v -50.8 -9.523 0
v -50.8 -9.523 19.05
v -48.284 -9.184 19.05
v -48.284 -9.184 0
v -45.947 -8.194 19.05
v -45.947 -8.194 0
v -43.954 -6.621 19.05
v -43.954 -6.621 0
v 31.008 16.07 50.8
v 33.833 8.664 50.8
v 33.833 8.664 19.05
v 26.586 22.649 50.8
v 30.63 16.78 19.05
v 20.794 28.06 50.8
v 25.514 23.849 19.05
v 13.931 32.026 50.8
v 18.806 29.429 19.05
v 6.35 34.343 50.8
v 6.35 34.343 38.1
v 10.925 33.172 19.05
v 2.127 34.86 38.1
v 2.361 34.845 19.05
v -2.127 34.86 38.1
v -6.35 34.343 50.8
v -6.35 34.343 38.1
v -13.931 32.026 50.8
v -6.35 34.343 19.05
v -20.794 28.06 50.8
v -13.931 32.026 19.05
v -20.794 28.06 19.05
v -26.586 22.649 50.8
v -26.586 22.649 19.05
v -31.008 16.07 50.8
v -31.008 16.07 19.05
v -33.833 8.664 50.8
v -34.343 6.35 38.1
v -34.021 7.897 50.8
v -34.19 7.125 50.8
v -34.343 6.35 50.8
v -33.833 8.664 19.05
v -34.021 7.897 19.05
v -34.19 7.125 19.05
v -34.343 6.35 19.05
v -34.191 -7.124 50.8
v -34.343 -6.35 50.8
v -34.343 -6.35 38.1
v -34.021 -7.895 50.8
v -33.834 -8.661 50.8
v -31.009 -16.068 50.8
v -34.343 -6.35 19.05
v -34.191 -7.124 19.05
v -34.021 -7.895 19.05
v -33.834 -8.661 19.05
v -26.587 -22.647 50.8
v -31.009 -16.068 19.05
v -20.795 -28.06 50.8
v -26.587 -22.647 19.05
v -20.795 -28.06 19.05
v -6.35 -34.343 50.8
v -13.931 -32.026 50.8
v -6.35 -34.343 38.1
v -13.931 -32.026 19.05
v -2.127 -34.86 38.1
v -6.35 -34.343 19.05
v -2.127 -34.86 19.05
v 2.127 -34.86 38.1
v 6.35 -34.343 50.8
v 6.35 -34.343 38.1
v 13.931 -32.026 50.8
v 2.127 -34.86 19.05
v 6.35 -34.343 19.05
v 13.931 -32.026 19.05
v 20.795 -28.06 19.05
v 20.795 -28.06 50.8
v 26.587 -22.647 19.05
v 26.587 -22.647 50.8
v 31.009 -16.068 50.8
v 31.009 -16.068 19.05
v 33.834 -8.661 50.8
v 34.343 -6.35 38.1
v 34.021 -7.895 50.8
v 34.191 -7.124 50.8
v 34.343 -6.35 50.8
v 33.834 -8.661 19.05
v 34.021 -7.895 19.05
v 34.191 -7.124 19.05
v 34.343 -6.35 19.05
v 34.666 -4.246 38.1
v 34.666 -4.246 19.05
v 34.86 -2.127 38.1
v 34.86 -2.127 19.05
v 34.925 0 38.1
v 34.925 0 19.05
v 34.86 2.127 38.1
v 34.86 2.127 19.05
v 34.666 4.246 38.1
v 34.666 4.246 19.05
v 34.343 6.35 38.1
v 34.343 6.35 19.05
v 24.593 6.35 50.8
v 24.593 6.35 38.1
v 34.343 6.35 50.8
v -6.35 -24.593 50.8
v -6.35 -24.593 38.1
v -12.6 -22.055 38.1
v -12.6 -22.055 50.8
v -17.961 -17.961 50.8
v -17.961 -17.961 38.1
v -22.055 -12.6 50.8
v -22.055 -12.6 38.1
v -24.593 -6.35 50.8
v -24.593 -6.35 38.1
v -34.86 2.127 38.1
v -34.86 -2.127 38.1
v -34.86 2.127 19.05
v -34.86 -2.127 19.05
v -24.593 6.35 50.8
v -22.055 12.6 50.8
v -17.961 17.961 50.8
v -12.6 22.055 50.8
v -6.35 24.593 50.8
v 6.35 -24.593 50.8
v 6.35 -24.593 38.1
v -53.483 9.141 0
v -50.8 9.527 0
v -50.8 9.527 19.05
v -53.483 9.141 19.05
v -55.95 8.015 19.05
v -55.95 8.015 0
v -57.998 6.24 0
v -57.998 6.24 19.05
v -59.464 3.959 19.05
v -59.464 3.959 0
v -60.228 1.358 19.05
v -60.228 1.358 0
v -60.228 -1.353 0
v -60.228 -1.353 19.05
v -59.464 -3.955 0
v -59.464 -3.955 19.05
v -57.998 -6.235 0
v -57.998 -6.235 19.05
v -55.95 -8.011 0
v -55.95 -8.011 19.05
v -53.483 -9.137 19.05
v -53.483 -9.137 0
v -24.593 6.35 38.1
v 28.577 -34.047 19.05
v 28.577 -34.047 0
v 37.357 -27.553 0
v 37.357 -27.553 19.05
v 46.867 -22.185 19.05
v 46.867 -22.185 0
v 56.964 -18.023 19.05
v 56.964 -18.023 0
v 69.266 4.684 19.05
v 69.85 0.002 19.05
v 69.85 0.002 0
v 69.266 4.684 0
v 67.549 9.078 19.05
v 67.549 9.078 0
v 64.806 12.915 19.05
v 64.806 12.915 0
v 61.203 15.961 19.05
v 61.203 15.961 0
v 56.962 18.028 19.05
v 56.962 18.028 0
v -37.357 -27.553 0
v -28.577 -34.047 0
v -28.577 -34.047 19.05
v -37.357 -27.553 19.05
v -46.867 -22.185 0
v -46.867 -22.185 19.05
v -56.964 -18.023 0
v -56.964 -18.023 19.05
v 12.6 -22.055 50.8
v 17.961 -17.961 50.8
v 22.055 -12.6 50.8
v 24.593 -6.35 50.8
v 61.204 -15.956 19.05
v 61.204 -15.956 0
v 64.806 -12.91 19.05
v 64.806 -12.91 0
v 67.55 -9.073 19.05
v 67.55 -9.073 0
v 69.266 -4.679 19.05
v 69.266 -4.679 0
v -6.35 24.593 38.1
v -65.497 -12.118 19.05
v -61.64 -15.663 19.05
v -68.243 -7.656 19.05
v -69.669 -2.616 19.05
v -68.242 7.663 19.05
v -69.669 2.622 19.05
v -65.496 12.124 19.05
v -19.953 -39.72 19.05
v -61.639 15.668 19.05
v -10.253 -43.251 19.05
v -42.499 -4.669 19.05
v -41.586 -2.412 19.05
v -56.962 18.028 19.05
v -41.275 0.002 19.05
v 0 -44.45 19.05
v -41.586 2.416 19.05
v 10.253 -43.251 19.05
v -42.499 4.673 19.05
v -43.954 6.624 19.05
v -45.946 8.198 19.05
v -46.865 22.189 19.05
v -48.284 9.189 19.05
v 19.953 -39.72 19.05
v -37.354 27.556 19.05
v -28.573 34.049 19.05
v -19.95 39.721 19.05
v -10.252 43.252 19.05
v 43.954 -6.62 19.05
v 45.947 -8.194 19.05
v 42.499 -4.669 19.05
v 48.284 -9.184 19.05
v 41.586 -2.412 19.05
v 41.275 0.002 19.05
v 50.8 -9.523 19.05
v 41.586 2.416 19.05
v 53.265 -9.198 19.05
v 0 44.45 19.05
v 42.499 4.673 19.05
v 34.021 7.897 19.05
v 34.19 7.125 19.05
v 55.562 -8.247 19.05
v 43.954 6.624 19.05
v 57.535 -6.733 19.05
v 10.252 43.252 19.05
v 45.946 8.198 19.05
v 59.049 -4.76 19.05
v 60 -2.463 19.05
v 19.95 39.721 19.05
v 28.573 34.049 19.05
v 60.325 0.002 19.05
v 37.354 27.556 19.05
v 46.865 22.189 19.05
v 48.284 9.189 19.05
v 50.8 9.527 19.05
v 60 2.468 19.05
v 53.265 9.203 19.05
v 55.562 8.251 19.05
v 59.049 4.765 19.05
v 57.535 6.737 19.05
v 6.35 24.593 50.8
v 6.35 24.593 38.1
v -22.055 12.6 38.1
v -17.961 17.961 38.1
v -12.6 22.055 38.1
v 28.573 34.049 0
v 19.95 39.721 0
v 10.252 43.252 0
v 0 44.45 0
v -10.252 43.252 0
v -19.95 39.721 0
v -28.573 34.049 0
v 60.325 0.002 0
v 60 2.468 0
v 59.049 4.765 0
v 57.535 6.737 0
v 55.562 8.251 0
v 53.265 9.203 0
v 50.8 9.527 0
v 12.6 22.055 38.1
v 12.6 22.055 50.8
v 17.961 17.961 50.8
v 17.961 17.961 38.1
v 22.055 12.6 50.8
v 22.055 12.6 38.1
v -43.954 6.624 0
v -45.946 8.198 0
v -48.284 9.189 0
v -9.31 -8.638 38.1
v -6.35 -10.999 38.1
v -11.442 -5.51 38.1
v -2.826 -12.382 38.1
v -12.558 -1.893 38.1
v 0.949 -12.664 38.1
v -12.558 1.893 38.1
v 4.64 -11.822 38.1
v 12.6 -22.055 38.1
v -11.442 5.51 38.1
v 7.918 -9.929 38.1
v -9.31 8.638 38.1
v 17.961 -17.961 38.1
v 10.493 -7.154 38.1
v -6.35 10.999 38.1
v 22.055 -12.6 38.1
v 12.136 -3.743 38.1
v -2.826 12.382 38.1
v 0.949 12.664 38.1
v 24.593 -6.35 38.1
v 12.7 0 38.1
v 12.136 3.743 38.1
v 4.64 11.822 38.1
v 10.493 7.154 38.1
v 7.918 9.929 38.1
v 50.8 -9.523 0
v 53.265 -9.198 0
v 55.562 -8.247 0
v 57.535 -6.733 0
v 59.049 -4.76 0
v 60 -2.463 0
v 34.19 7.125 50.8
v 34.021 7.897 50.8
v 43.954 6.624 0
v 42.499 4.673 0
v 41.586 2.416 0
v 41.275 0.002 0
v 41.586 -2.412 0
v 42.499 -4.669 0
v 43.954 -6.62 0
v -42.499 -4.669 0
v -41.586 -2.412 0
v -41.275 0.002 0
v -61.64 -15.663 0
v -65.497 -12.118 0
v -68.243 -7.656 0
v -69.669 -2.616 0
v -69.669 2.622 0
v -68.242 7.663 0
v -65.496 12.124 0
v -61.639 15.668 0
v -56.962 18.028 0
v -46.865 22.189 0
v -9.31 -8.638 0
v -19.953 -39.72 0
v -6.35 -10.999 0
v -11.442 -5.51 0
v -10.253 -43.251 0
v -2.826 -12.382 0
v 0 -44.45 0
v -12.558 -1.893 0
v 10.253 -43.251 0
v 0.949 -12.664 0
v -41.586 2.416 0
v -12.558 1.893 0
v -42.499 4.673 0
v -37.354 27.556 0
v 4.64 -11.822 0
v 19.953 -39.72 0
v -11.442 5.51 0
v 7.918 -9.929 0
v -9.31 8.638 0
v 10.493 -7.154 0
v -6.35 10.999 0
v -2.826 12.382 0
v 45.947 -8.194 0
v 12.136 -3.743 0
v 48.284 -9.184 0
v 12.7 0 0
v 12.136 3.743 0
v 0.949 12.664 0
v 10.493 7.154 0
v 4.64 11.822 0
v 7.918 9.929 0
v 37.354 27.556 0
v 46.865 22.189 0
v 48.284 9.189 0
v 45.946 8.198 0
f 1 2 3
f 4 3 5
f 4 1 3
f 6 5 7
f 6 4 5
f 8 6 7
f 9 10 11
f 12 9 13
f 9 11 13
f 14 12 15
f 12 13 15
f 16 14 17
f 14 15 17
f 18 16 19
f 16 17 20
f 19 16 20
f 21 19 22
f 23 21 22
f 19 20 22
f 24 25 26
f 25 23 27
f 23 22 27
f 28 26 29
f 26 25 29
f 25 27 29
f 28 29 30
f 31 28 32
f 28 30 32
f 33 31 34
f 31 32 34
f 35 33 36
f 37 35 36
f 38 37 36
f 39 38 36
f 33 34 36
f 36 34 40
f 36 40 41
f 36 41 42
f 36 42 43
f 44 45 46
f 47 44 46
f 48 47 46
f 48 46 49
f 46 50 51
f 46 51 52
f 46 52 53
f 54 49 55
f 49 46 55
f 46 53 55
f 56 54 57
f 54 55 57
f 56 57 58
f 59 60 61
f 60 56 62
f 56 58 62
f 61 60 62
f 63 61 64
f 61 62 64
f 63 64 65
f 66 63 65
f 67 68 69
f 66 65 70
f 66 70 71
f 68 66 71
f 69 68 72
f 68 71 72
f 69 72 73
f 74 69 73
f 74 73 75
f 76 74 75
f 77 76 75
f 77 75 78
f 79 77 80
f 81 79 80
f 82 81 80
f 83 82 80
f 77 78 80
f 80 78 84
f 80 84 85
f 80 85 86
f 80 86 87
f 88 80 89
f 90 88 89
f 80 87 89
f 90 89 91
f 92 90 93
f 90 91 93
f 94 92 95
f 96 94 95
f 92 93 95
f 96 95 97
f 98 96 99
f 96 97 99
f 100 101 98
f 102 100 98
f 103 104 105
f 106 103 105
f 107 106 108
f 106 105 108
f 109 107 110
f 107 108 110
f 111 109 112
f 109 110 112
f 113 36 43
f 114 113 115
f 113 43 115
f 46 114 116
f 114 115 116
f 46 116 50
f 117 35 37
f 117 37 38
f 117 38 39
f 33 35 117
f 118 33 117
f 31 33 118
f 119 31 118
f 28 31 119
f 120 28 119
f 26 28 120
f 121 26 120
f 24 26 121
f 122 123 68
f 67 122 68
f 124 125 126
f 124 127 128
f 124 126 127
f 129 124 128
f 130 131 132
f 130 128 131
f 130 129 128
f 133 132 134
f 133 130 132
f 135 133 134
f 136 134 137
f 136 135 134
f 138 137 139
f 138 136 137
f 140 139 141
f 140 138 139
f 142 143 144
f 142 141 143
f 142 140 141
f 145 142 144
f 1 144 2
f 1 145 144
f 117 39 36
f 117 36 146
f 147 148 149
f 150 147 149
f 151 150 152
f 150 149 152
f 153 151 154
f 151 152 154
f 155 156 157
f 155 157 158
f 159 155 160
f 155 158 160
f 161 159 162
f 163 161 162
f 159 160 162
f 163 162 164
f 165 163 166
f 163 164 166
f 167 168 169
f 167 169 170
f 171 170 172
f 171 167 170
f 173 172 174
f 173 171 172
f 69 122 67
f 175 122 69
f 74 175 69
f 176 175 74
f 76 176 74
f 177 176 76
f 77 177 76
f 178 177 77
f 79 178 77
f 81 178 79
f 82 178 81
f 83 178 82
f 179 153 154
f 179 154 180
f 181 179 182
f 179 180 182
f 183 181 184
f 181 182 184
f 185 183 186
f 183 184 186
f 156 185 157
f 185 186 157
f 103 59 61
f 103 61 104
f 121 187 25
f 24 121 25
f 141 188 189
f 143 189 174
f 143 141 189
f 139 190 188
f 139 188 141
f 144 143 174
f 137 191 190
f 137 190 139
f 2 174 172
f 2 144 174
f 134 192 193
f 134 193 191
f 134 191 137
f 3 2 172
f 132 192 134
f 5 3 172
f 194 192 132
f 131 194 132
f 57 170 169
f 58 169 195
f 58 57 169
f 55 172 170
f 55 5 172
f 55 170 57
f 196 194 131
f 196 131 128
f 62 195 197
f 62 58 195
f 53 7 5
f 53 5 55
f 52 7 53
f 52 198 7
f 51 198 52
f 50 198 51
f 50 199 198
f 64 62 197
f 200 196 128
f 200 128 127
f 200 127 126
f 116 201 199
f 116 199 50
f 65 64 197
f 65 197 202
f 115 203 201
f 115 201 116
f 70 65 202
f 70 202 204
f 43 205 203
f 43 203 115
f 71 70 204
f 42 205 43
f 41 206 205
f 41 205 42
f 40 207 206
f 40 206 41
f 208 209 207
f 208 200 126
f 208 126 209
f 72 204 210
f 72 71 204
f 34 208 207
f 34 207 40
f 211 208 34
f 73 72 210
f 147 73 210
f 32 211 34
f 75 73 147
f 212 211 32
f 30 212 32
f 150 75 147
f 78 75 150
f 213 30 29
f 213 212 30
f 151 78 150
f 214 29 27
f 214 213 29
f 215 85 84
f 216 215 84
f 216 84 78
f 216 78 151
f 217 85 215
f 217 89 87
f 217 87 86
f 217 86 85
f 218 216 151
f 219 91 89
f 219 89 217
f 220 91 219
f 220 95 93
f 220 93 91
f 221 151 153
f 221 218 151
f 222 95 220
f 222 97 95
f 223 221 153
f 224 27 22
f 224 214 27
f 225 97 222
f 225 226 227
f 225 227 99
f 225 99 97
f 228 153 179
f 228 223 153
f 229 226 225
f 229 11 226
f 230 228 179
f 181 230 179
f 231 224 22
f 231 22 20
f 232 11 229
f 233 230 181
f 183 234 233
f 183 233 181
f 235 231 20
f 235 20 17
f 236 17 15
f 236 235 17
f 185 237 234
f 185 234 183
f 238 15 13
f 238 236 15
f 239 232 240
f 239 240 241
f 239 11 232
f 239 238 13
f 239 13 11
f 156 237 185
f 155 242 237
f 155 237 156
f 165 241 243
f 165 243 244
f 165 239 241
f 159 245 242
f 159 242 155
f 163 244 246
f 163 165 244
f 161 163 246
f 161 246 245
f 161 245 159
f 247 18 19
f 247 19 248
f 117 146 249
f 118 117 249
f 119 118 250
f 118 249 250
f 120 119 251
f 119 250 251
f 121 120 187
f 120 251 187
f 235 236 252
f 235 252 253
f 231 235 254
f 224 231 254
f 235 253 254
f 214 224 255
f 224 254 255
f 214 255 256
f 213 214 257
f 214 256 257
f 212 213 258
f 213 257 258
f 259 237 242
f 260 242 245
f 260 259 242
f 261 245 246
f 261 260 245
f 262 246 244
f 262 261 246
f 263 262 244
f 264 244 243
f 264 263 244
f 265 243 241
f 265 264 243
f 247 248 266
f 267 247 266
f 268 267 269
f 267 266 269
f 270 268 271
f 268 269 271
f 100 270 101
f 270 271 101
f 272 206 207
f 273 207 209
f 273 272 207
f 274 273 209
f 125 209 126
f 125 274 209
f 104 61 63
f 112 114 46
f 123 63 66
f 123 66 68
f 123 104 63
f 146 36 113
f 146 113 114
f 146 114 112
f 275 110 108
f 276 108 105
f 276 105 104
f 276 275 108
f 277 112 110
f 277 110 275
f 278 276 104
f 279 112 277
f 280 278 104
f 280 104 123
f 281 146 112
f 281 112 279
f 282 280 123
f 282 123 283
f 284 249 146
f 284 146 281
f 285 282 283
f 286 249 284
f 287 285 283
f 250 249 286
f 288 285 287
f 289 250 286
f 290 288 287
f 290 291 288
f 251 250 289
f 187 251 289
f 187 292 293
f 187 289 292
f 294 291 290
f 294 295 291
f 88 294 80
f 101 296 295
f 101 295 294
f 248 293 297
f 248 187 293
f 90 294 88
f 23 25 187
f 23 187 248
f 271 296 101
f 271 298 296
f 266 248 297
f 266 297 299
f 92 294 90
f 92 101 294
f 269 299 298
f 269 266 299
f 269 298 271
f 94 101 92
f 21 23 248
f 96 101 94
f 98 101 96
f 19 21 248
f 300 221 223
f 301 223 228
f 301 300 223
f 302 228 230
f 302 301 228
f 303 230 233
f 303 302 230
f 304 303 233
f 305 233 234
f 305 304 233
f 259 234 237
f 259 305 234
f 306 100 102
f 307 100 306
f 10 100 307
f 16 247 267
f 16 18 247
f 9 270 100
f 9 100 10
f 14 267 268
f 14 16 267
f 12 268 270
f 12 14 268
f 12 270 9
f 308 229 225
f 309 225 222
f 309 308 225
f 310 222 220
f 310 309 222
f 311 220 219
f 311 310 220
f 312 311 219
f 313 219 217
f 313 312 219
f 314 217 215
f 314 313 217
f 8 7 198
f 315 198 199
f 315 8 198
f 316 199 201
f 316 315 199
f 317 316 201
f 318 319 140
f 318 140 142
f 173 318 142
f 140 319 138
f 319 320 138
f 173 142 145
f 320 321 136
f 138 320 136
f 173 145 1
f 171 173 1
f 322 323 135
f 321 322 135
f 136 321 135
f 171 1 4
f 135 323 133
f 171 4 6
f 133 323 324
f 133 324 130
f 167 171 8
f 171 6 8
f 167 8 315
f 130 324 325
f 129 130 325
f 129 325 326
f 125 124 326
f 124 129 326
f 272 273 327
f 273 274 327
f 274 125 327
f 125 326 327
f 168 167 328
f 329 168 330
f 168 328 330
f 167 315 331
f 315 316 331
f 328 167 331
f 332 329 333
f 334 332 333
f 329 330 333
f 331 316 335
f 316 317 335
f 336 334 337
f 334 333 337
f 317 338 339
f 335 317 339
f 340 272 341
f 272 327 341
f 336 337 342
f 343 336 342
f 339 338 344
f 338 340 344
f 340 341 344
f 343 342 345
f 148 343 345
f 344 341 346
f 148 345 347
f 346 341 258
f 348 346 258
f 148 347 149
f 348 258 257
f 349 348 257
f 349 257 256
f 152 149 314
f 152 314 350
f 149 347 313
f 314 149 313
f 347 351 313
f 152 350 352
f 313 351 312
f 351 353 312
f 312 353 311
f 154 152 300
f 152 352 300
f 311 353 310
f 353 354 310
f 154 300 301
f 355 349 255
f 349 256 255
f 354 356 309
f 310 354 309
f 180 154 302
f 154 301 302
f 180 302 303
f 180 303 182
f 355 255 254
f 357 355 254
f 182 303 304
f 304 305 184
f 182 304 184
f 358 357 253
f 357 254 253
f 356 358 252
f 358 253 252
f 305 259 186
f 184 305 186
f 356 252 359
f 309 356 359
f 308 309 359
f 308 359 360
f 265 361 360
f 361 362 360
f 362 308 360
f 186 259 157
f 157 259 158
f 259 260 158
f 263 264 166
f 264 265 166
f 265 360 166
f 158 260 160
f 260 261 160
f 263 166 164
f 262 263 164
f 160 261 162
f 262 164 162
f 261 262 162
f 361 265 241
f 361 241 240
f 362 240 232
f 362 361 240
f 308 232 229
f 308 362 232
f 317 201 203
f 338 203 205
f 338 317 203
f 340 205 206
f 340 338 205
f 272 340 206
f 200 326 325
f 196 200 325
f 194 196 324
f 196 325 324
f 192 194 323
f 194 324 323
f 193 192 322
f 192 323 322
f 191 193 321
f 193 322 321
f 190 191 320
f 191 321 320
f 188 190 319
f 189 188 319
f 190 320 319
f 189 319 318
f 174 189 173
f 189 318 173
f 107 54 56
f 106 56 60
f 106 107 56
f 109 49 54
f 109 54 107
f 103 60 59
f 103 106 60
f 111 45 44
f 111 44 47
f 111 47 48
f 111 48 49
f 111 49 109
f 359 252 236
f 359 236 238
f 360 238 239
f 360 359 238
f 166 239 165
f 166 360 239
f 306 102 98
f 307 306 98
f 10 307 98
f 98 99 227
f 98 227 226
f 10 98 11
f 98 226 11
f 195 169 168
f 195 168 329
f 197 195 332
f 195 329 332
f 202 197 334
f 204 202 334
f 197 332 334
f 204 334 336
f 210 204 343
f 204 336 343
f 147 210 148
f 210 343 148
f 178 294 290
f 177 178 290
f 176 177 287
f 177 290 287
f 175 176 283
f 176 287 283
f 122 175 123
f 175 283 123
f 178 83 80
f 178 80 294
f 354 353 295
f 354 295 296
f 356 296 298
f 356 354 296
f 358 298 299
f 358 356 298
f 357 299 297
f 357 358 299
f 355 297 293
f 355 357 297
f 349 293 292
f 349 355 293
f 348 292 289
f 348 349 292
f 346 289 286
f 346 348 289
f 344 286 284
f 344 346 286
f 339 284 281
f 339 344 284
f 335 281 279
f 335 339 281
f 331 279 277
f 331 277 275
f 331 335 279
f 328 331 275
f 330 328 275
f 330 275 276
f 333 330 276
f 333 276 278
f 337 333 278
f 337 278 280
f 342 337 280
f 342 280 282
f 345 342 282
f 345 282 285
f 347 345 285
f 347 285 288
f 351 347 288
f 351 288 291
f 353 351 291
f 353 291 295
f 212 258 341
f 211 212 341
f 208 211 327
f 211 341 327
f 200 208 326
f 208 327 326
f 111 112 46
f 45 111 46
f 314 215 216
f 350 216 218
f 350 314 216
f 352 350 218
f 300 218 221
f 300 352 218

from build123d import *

# Parameters (mm, degrees)
F0_R        = 12.7
F1_DEPTH    = 19.05
F2_DEPTH    = 38.1
F3_DEPTH    = 50.8
F4_T1_DEPTH = 19.05
F5_DEPTH    = 25.4


# Not quite as in the source:
# - a fillet or chamfer that OpenCascade refuses, or shapes differently, is made with other operations: its cross-section is extruded or revolved along the edge and cut away or added


with BuildPart() as f1:
    # F0 (on Top) → F1 (new body)
    with BuildSketch(Plane.XY):
        with BuildLine():
            ThreePointArc((-50.7999117786, -19.0477195084), (-45.869861945, -18.3987278677), (-41.2757240411, -16.4959723838))
            ThreePointArc((-41.2757240411, -16.4959723838), (-42.9000661545, -11.6355843833), (-43.9541916189, -6.620539187))
            ThreePointArc((-43.9541916189, -6.620539187), (-47.0821659857, -8.7672115815), (-50.7999117786, -9.5227195084))
            Line((-50.7999117786, -9.5227195084), (-50.7999117786, -19.0477195084))
        make_face()
        with BuildLine():
            ThreePointArc((33.8339826183, -8.661249632), (23.8448022993, -25.5182489271), (6.35, -34.3428758988))
            ThreePointArc((6.35, -34.3428758988), (0, -34.925), (-6.35, -34.3428758988))
            ThreePointArc((-6.35, -34.3428758988), (-23.8447589032, -25.5182894774), (-33.8339531596, -8.6613647075))
            ThreePointArc((-33.8339531596, -8.6613647075), (-36.9876986012, -13.1173714527), (-41.2757240411, -16.4959723838))
            ThreePointArc((-41.2757240411, -16.4959723838), (2.22821e-05, -44.45), (41.2757405794, -16.495931002))
            ThreePointArc((41.2757405794, -16.495931002), (36.9877138276, -13.1172946041), (33.8339826183, -8.661249632))
        make_face()
        with BuildLine():
            ThreePointArc((6.35, 24.5934442484), (17.9605122421, 17.9605122421), (24.5934442484, 6.35))
            Line((24.5934442484, 6.35), (32.8386816452, 6.35))
            ThreePointArc((32.8386816452, 6.35), (33.2976498796, 7.5235995423), (33.8332048478, 8.6642873181))
            ThreePointArc((33.8332048478, 8.6642873181), (23.8436567211, 25.519319332), (6.35, 34.3428758988))
            Line((6.35, 34.3428758988), (6.35, 24.5934442484))
        make_face()
        with BuildLine():
            ThreePointArc((50.8, 19.0522804916), (45.8690841465, 18.4030568025), (41.2742593566, 16.4996368009))
            ThreePointArc((41.2742593566, 16.4996368009), (42.8990375845, 11.6393760281), (43.9536089212, 6.6244066))
            ThreePointArc((43.9536089212, 6.6244066), (47.0818099956, 8.771584232), (50.8, 9.5272804916))
            Line((50.8, 9.5272804916), (50.8, 19.0522804916))
        make_face()
        with BuildLine():
            ThreePointArc((-43.953597028, 6.6244855122), (-42.8990213005, 11.6394360455), (-41.274242812, 16.4996781876))
            ThreePointArc((-41.274242812, 16.4996781876), (-45.8690358984, 18.4030675143), (-50.7999117786, 19.0522804916))
            Line((-50.7999117786, 19.0522804916), (-50.7999117786, 9.5272804916))
            ThreePointArc((-50.7999117786, 9.5272804916), (-47.0817723125, 8.7716056601), (-43.953597028, 6.6244855122))
        make_face()
        with BuildLine():
            ThreePointArc((-24.5934442484, -6.35), (-25.4, 0), (-24.5934442484, 6.35))
            Line((-24.5934442484, 6.35), (-32.8385934238, 6.35))
            ThreePointArc((-32.8385934238, 6.35), (-32.0240547455, 3.2224812106), (-31.7499117786, 0.0022804916))
            ThreePointArc((-31.7499117786, 0.0022804916), (-32.0244637739, -3.2203042194), (-32.8402059749, -6.35))
            Line((-32.8402059749, -6.35), (-24.5934442484, -6.35))
        make_face()
        with BuildLine():
            ThreePointArc((-34.3428758988, 6.35), (-34.1076619913, 7.5115257095), (-33.8331753774, 8.6644023962))
            ThreePointArc((-33.8331753774, 8.6644023962), (-36.9865207313, 13.1206922771), (-41.274242812, 16.4996781876))
            ThreePointArc((-41.274242812, 16.4996781876), (-42.8990213005, 11.6394360455), (-43.953597028, 6.6244855122))
            ThreePointArc((-43.953597028, 6.6244855122), (-41.9699408557, 3.5740081548), (-41.2749117786, 0.0022804916))
            ThreePointArc((-41.2749117786, 0.0022804916), (-41.9701012053, -3.5698435599), (-43.9541916189, -6.620539187))
            ThreePointArc((-43.9541916189, -6.620539187), (-42.9000661545, -11.6355843833), (-41.2757240411, -16.4959723838))
            ThreePointArc((-41.2757240411, -16.4959723838), (-36.9876986012, -13.1173714527), (-33.8339531596, -8.6613647075))
            ThreePointArc((-33.8339531596, -8.6613647075), (-34.1079991617, -7.5099945529), (-34.3428758988, -6.35))
            ThreePointArc((-34.3428758988, -6.35), (-34.925, 0), (-34.3428758988, 6.35))
        make_face()
        with BuildLine():
            ThreePointArc((-43.9541916189, -6.620539187), (-44.4499999552, 0.0019954336), (-43.953597028, 6.6244855122))
            ThreePointArc((-43.953597028, 6.6244855122), (-47.0817723125, 8.7716056601), (-50.7999117786, 9.5272804916))
            Line((-50.7999117786, 9.5272804916), (-50.7999117786, -9.5227195084))
            ThreePointArc((-50.7999117786, -9.5227195084), (-47.0821659857, -8.7672115815), (-43.9541916189, -6.620539187))
        make_face()
        with BuildLine():
            ThreePointArc((-41.2749117786, 0.0022804916), (-41.9699408557, 3.5740081548), (-43.953597028, 6.6244855122))
            ThreePointArc((-43.953597028, 6.6244855122), (-44.4499999552, 0.0019954336), (-43.9541916189, -6.620539187))
            ThreePointArc((-43.9541916189, -6.620539187), (-41.9701012053, -3.5698435599), (-41.2749117786, 0.0022804916))
        make_face()
        with BuildLine():
            Line((34.3428758988, 6.35), (32.8386816452, 6.35))
            ThreePointArc((32.8386816452, 6.35), (31.7500001536, -0.000138335), (32.8402941963, -6.35))
            Line((32.8402941963, -6.35), (34.3428758988, -6.35))
            ThreePointArc((34.3428758988, -6.35), (34.7791644937, -3.1883133656), (34.925, 0))
            ThreePointArc((34.925, 0), (34.7791644937, 3.1883133656), (34.3428758988, 6.35))
        make_face()
        with BuildLine():
            ThreePointArc((24.5934442484, -6.35), (25.1975542852, -3.2005090291), (25.4, 0))
            ThreePointArc((25.4, 0), (25.1975542852, 3.2005090291), (24.5934442484, 6.35))
            ThreePointArc((24.5934442484, 6.35), (17.9605122421, 17.9605122421), (6.35, 24.5934442484))
            ThreePointArc((6.35, 24.5934442484), (0, 25.4), (-6.35, 24.5934442484))
            ThreePointArc((-6.35, 24.5934442484), (-17.9605122421, 17.9605122421), (-24.5934442484, 6.35))
            ThreePointArc((-24.5934442484, 6.35), (-25.4, 0), (-24.5934442484, -6.35))
            ThreePointArc((-24.5934442484, -6.35), (-17.9605122421, -17.9605122421), (-6.35, -24.5934442484))
            ThreePointArc((-6.35, -24.5934442484), (0, -25.4), (6.35, -24.5934442484))
            ThreePointArc((6.35, -24.5934442484), (17.9605122421, -17.9605122421), (24.5934442484, -6.35))
        make_face()
        Circle(F0_R, mode=Mode.SUBTRACT)
        with BuildLine():
            Line((6.35, -34.3428758988), (6.35, -24.5934442484))
            ThreePointArc((6.35, -24.5934442484), (0, -25.4), (-6.35, -24.5934442484))
            Line((-6.35, -24.5934442484), (-6.35, -34.3428758988))
            ThreePointArc((-6.35, -34.3428758988), (0, -34.925), (6.35, -34.3428758988))
        make_face()
        with BuildLine():
            ThreePointArc((-6.35, 24.5934442484), (0, 25.4), (6.35, 24.5934442484))
            Line((6.35, 24.5934442484), (6.35, 34.3428758988))
            ThreePointArc((6.35, 34.3428758988), (0, 34.925), (-6.35, 34.3428758988))
            Line((-6.35, 34.3428758988), (-6.35, 24.5934442484))
        make_face()
        with BuildLine():
            ThreePointArc((69.85, 0.0022804916), (64.2703841816, 13.4726646732), (50.8, 19.0522804916))
            Line((50.8, 19.0522804916), (50.8, 9.5272804916))
            ThreePointArc((50.8, 9.5272804916), (57.5351920908, 6.7374725824), (60.325, 0.0022804916))
            ThreePointArc((60.325, 0.0022804916), (57.5351920908, -6.7329115992), (50.8, -9.5227195084))
            Line((50.8, -9.5227195084), (50.8, -19.0477195084))
            ThreePointArc((50.8, -19.0477195084), (64.2703841816, -13.46810369), (69.85, 0.0022804916))
        make_face()
        with BuildLine():
            ThreePointArc((-24.5934442484, 6.35), (-17.9605122421, 17.9605122421), (-6.35, 24.5934442484))
            Line((-6.35, 24.5934442484), (-6.35, 34.3428758988))
            ThreePointArc((-6.35, 34.3428758988), (-23.8436133211, 25.5193598821), (-33.8331753774, 8.6644023962))
            ThreePointArc((-33.8331753774, 8.6644023962), (-33.2975871652, 7.5236588976), (-32.8385934238, 6.35))
            Line((-32.8385934238, 6.35), (-24.5934442484, 6.35))
        make_face()
        with BuildLine():
            Line((-6.35, -34.3428758988), (-6.35, -24.5934442484))
            ThreePointArc((-6.35, -24.5934442484), (-17.9605122421, -17.9605122421), (-24.5934442484, -6.35))
            Line((-24.5934442484, -6.35), (-32.8402059749, -6.35))
            ThreePointArc((-32.8402059749, -6.35), (-33.2988800792, -7.5221058258), (-33.8339531596, -8.6613647075))
            ThreePointArc((-33.8339531596, -8.6613647075), (-23.8447589032, -25.5182894774), (-6.35, -34.3428758988))
        make_face()
        with BuildLine():
            Line((-50.7999117786, -9.5227195084), (-50.7999117786, 9.5272804916))
            ThreePointArc((-50.7999117786, 9.5272804916), (-60.3249117786, 0.0022804916), (-50.7999117786, -9.5227195084))
        make_face()
        with BuildLine():
            Line((-50.7999117786, 9.5272804916), (-50.7999117786, 19.0522804916))
            ThreePointArc((-50.7999117786, 19.0522804916), (-69.8499117786, 0.0022804916), (-50.7999117786, -19.0477195084))
            Line((-50.7999117786, -19.0477195084), (-50.7999117786, -9.5227195084))
            ThreePointArc((-50.7999117786, -9.5227195084), (-60.3249117786, 0.0022804916), (-50.7999117786, 9.5272804916))
        make_face()
        with BuildLine():
            ThreePointArc((-31.7499117786, 0.0022804916), (-32.0240547455, 3.2224812106), (-32.8385934238, 6.35))
            Line((-32.8385934238, 6.35), (-34.3428758988, 6.35))
            ThreePointArc((-34.3428758988, 6.35), (-34.925, 0), (-34.3428758988, -6.35))
            Line((-34.3428758988, -6.35), (-32.8402059749, -6.35))
            ThreePointArc((-32.8402059749, -6.35), (-32.0244637739, -3.2203042194), (-31.7499117786, 0.0022804916))
        make_face()
        with BuildLine():
            ThreePointArc((44.45, 0), (44.3257285137, 3.3214893838), (43.9536089212, 6.6244066))
            ThreePointArc((43.9536089212, 6.6244066), (41.2750000096, 0.0018528994), (43.954203504, -6.6204602806))
            ThreePointArc((43.954203504, -6.6204602806), (44.3258775759, -3.319499529), (44.45, 0))
        make_face()
        with BuildLine():
            ThreePointArc((-6.35, 34.3428758988), (0, 34.925), (6.35, 34.3428758988))
            ThreePointArc((6.35, 34.3428758988), (23.8436567211, 25.519319332), (33.8332048478, 8.6642873181))
            ThreePointArc((33.8332048478, 8.6642873181), (36.9865359667, 13.1206154241), (41.2742593566, 16.4996368009))
            ThreePointArc((41.2742593566, 16.4996368009), (2.22855e-05, 44.45), (-41.274242812, 16.4996781876))
            ThreePointArc((-41.274242812, 16.4996781876), (-36.9865207313, 13.1206922771), (-33.8331753774, 8.6644023962))
            ThreePointArc((-33.8331753774, 8.6644023962), (-23.8436133211, 25.5193598821), (-6.35, 34.3428758988))
        make_face()
        with BuildLine():
            ThreePointArc((50.8, 9.5272804916), (47.0818099956, 8.771584232), (43.9536089212, 6.6244066))
            ThreePointArc((43.9536089212, 6.6244066), (44.3257285137, 3.3214893838), (44.45, 0))
            ThreePointArc((44.45, 0), (44.3258775759, -3.319499529), (43.954203504, -6.6204602806))
            ThreePointArc((43.954203504, -6.6204602806), (47.0822036672, -8.7671901554), (50.8, -9.5227195084))
            Line((50.8, -9.5227195084), (50.8, 9.5272804916))
        make_face()
        with BuildLine():
            ThreePointArc((60.325, 0.0022804916), (57.5351920908, 6.7374725824), (50.8, 9.5272804916))
            Line((50.8, 9.5272804916), (50.8, -9.5227195084))
            ThreePointArc((50.8, -9.5227195084), (57.5351920908, -6.7329115992), (60.325, 0.0022804916))
        make_face()
        with BuildLine():
            ThreePointArc((43.954203504, -6.6204602806), (42.9000824312, -11.6355243712), (41.2757405794, -16.495931002))
            ThreePointArc((41.2757405794, -16.495931002), (45.8699101912, -18.3987171574), (50.8, -19.0477195084))
            Line((50.8, -19.0477195084), (50.8, -9.5227195084))
            ThreePointArc((50.8, -9.5227195084), (47.0822036672, -8.7671901554), (43.954203504, -6.6204602806))
        make_face()
        with BuildLine():
            ThreePointArc((24.5934442484, 6.35), (25.1975542852, 3.2005090291), (25.4, 0))
            ThreePointArc((25.4, 0), (25.1975542852, -3.2005090291), (24.5934442484, -6.35))
            Line((24.5934442484, -6.35), (32.8402941963, -6.35))
            ThreePointArc((32.8402941963, -6.35), (31.7500001536, -0.000138335), (32.8386816452, 6.35))
            Line((32.8386816452, 6.35), (24.5934442484, 6.35))
        make_face()
        with BuildLine():
            ThreePointArc((33.8332048478, 8.6642873181), (34.1076747659, 7.5114677036), (34.3428758988, 6.35))
            ThreePointArc((34.3428758988, 6.35), (34.7791644937, 3.1883133656), (34.925, 0))
            ThreePointArc((34.925, 0), (34.7791644937, -3.1883133656), (34.3428758988, -6.35))
            ThreePointArc((34.3428758988, -6.35), (34.1080119331, -7.5099365491), (33.8339826183, -8.661249632))
            ThreePointArc((33.8339826183, -8.661249632), (36.9877138276, -13.1172946041), (41.2757405794, -16.495931002))
            ThreePointArc((41.2757405794, -16.495931002), (42.9000824312, -11.6355243712), (43.954203504, -6.6204602806))
            ThreePointArc((43.954203504, -6.6204602806), (41.2750000096, 0.0018528994), (43.9536089212, 6.6244066))
            ThreePointArc((43.9536089212, 6.6244066), (42.8990375845, 11.6393760281), (41.2742593566, 16.4996368009))
            ThreePointArc((41.2742593566, 16.4996368009), (36.9865359667, 13.1206154241), (33.8332048478, 8.6642873181))
        make_face()
        with BuildLine():
            Line((32.8402941963, -6.35), (24.5934442484, -6.35))
            ThreePointArc((24.5934442484, -6.35), (17.9605122421, -17.9605122421), (6.35, -24.5934442484))
            Line((6.35, -24.5934442484), (6.35, -34.3428758988))
            ThreePointArc((6.35, -34.3428758988), (23.8448022993, -25.5182489271), (33.8339826183, -8.661249632))
            ThreePointArc((33.8339826183, -8.661249632), (33.2989427827, -7.5220464735), (32.8402941963, -6.35))
        make_face()
        with BuildLine():
            ThreePointArc((-33.8339531596, -8.6613647075), (-33.2988800792, -7.5221058258), (-32.8402059749, -6.35))
            Line((-32.8402059749, -6.35), (-34.3428758988, -6.35))
            ThreePointArc((-34.3428758988, -6.35), (-34.1079991617, -7.5099945529), (-33.8339531596, -8.6613647075))
        make_face()
        with BuildLine():
            ThreePointArc((33.8332048478, 8.6642873181), (33.2976498796, 7.5235995423), (32.8386816452, 6.35))
            Line((32.8386816452, 6.35), (34.3428758988, 6.35))
            ThreePointArc((34.3428758988, 6.35), (34.1076747659, 7.5114677036), (33.8332048478, 8.6642873181))
        make_face()
        with BuildLine():
            Line((34.3428758988, -6.35), (32.8402941963, -6.35))
            ThreePointArc((32.8402941963, -6.35), (33.2989427827, -7.5220464735), (33.8339826183, -8.661249632))
            ThreePointArc((33.8339826183, -8.661249632), (34.1080119331, -7.5099365491), (34.3428758988, -6.35))
        make_face()
        with BuildLine():
            Line((-34.3428758988, 6.35), (-32.8385934238, 6.35))
            ThreePointArc((-32.8385934238, 6.35), (-33.2975871652, 7.5236588976), (-33.8331753774, 8.6644023962))
            ThreePointArc((-33.8331753774, 8.6644023962), (-34.1076619913, 7.5115257095), (-34.3428758988, 6.35))
        make_face()
    extrude(amount=F1_DEPTH)

    # F0 (on Top) → F2 (join)
    with BuildSketch(Plane.XY):
        with BuildLine():
            ThreePointArc((-24.5934442484, -6.35), (-25.4, 0), (-24.5934442484, 6.35))
            Line((-24.5934442484, 6.35), (-32.8385934238, 6.35))
            ThreePointArc((-32.8385934238, 6.35), (-32.0240547455, 3.2224812106), (-31.7499117786, 0.0022804916))
            ThreePointArc((-31.7499117786, 0.0022804916), (-32.0244637739, -3.2203042194), (-32.8402059749, -6.35))
            Line((-32.8402059749, -6.35), (-24.5934442484, -6.35))
        make_face()
        with BuildLine():
            ThreePointArc((-31.7499117786, 0.0022804916), (-32.0240547455, 3.2224812106), (-32.8385934238, 6.35))
            Line((-32.8385934238, 6.35), (-34.3428758988, 6.35))
            ThreePointArc((-34.3428758988, 6.35), (-34.925, 0), (-34.3428758988, -6.35))
            Line((-34.3428758988, -6.35), (-32.8402059749, -6.35))
            ThreePointArc((-32.8402059749, -6.35), (-32.0244637739, -3.2203042194), (-31.7499117786, 0.0022804916))
        make_face()
        with BuildLine():
            Line((6.35, -34.3428758988), (6.35, -24.5934442484))
            ThreePointArc((6.35, -24.5934442484), (0, -25.4), (-6.35, -24.5934442484))
            Line((-6.35, -24.5934442484), (-6.35, -34.3428758988))
            ThreePointArc((-6.35, -34.3428758988), (0, -34.925), (6.35, -34.3428758988))
        make_face()
        with BuildLine():
            ThreePointArc((-6.35, 24.5934442484), (0, 25.4), (6.35, 24.5934442484))
            Line((6.35, 24.5934442484), (6.35, 34.3428758988))
            ThreePointArc((6.35, 34.3428758988), (0, 34.925), (-6.35, 34.3428758988))
            Line((-6.35, 34.3428758988), (-6.35, 24.5934442484))
        make_face()
        with BuildLine():
            ThreePointArc((24.5934442484, 6.35), (25.1975542852, 3.2005090291), (25.4, 0))
            ThreePointArc((25.4, 0), (25.1975542852, -3.2005090291), (24.5934442484, -6.35))
            Line((24.5934442484, -6.35), (32.8402941963, -6.35))
            ThreePointArc((32.8402941963, -6.35), (31.7500001536, -0.000138335), (32.8386816452, 6.35))
            Line((32.8386816452, 6.35), (24.5934442484, 6.35))
        make_face()
        with BuildLine():
            Line((34.3428758988, 6.35), (32.8386816452, 6.35))
            ThreePointArc((32.8386816452, 6.35), (31.7500001536, -0.000138335), (32.8402941963, -6.35))
            Line((32.8402941963, -6.35), (34.3428758988, -6.35))
            ThreePointArc((34.3428758988, -6.35), (34.7791644937, -3.1883133656), (34.925, 0))
            ThreePointArc((34.925, 0), (34.7791644937, 3.1883133656), (34.3428758988, 6.35))
        make_face()
        with BuildLine():
            ThreePointArc((24.5934442484, -6.35), (25.1975542852, -3.2005090291), (25.4, 0))
            ThreePointArc((25.4, 0), (25.1975542852, 3.2005090291), (24.5934442484, 6.35))
            ThreePointArc((24.5934442484, 6.35), (17.9605122421, 17.9605122421), (6.35, 24.5934442484))
            ThreePointArc((6.35, 24.5934442484), (0, 25.4), (-6.35, 24.5934442484))
            ThreePointArc((-6.35, 24.5934442484), (-17.9605122421, 17.9605122421), (-24.5934442484, 6.35))
            ThreePointArc((-24.5934442484, 6.35), (-25.4, 0), (-24.5934442484, -6.35))
            ThreePointArc((-24.5934442484, -6.35), (-17.9605122421, -17.9605122421), (-6.35, -24.5934442484))
            ThreePointArc((-6.35, -24.5934442484), (0, -25.4), (6.35, -24.5934442484))
            ThreePointArc((6.35, -24.5934442484), (17.9605122421, -17.9605122421), (24.5934442484, -6.35))
        make_face()
        Circle(F0_R, mode=Mode.SUBTRACT)
        with BuildLine():
            ThreePointArc((33.8332048478, 8.6642873181), (33.2976498796, 7.5235995423), (32.8386816452, 6.35))
            Line((32.8386816452, 6.35), (34.3428758988, 6.35))
            ThreePointArc((34.3428758988, 6.35), (34.1076747659, 7.5114677036), (33.8332048478, 8.6642873181))
        make_face()
        with BuildLine():
            Line((34.3428758988, -6.35), (32.8402941963, -6.35))
            ThreePointArc((32.8402941963, -6.35), (33.2989427827, -7.5220464735), (33.8339826183, -8.661249632))
            ThreePointArc((33.8339826183, -8.661249632), (34.1080119331, -7.5099365491), (34.3428758988, -6.35))
        make_face()
        with BuildLine():
            ThreePointArc((-33.8339531596, -8.6613647075), (-33.2988800792, -7.5221058258), (-32.8402059749, -6.35))
            Line((-32.8402059749, -6.35), (-34.3428758988, -6.35))
            ThreePointArc((-34.3428758988, -6.35), (-34.1079991617, -7.5099945529), (-33.8339531596, -8.6613647075))
        make_face()
        with BuildLine():
            Line((-34.3428758988, 6.35), (-32.8385934238, 6.35))
            ThreePointArc((-32.8385934238, 6.35), (-33.2975871652, 7.5236588976), (-33.8331753774, 8.6644023962))
            ThreePointArc((-33.8331753774, 8.6644023962), (-34.1076619913, 7.5115257095), (-34.3428758988, 6.35))
        make_face()
    extrude(amount=F2_DEPTH)

    # F0 (on Top) → F3 (join)
    with BuildSketch(Plane.XY):
        with BuildLine():
            Line((-6.35, -34.3428758988), (-6.35, -24.5934442484))
            ThreePointArc((-6.35, -24.5934442484), (-17.9605122421, -17.9605122421), (-24.5934442484, -6.35))
            Line((-24.5934442484, -6.35), (-32.8402059749, -6.35))
            ThreePointArc((-32.8402059749, -6.35), (-33.2988800792, -7.5221058258), (-33.8339531596, -8.6613647075))
            ThreePointArc((-33.8339531596, -8.6613647075), (-23.8447589032, -25.5182894774), (-6.35, -34.3428758988))
        make_face()
        with BuildLine():
            Line((32.8402941963, -6.35), (24.5934442484, -6.35))
            ThreePointArc((24.5934442484, -6.35), (17.9605122421, -17.9605122421), (6.35, -24.5934442484))
            Line((6.35, -24.5934442484), (6.35, -34.3428758988))
            ThreePointArc((6.35, -34.3428758988), (23.8448022993, -25.5182489271), (33.8339826183, -8.661249632))
            ThreePointArc((33.8339826183, -8.661249632), (33.2989427827, -7.5220464735), (32.8402941963, -6.35))
        make_face()
        with BuildLine():
            ThreePointArc((6.35, 24.5934442484), (17.9605122421, 17.9605122421), (24.5934442484, 6.35))
            Line((24.5934442484, 6.35), (32.8386816452, 6.35))
            ThreePointArc((32.8386816452, 6.35), (33.2976498796, 7.5235995423), (33.8332048478, 8.6642873181))
            ThreePointArc((33.8332048478, 8.6642873181), (23.8436567211, 25.519319332), (6.35, 34.3428758988))
            Line((6.35, 34.3428758988), (6.35, 24.5934442484))
        make_face()
        with BuildLine():
            ThreePointArc((-24.5934442484, 6.35), (-17.9605122421, 17.9605122421), (-6.35, 24.5934442484))
            Line((-6.35, 24.5934442484), (-6.35, 34.3428758988))
            ThreePointArc((-6.35, 34.3428758988), (-23.8436133211, 25.5193598821), (-33.8331753774, 8.6644023962))
            ThreePointArc((-33.8331753774, 8.6644023962), (-33.2975871652, 7.5236588976), (-32.8385934238, 6.35))
            Line((-32.8385934238, 6.35), (-24.5934442484, 6.35))
        make_face()
        with BuildLine():
            ThreePointArc((-33.8339531596, -8.6613647075), (-33.2988800792, -7.5221058258), (-32.8402059749, -6.35))
            Line((-32.8402059749, -6.35), (-34.3428758988, -6.35))
            ThreePointArc((-34.3428758988, -6.35), (-34.1079991617, -7.5099945529), (-33.8339531596, -8.6613647075))
        make_face()
        with BuildLine():
            Line((-34.3428758988, 6.35), (-32.8385934238, 6.35))
            ThreePointArc((-32.8385934238, 6.35), (-33.2975871652, 7.5236588976), (-33.8331753774, 8.6644023962))
            ThreePointArc((-33.8331753774, 8.6644023962), (-34.1076619913, 7.5115257095), (-34.3428758988, 6.35))
        make_face()
        with BuildLine():
            Line((34.3428758988, -6.35), (32.8402941963, -6.35))
            ThreePointArc((32.8402941963, -6.35), (33.2989427827, -7.5220464735), (33.8339826183, -8.661249632))
            ThreePointArc((33.8339826183, -8.661249632), (34.1080119331, -7.5099365491), (34.3428758988, -6.35))
        make_face()
        with BuildLine():
            ThreePointArc((33.8332048478, 8.6642873181), (33.2976498796, 7.5235995423), (32.8386816452, 6.35))
            Line((32.8386816452, 6.35), (34.3428758988, 6.35))
            ThreePointArc((34.3428758988, 6.35), (34.1076747659, 7.5114677036), (33.8332048478, 8.6642873181))
        make_face()
    extrude(amount=F3_DEPTH)

    # F4: fillet of radius 88.9 on 4 edges, made by hand

    # F4_s2 → F4_t1 (join)
    with BuildSketch(Plane.XY):
        with BuildLine():
            ThreePointArc((28.5765284312, -34.0467990099), (42.0295542971, -24.722587122), (56.9640444636, -18.0228978945))
            ThreePointArc((56.9640444636, -18.0228978945), (48.9545547659, -18.958121189), (41.2757405794, -16.495931002))
            ThreePointArc((41.2757405794, -16.495931002), (36.011708005, -26.0568491296), (28.5765284312, -34.0467990099))
        make_face()
        with BuildLine():
            ThreePointArc((28.5734714877, 34.0493645629), (42.0273344564, 24.7263605674), (56.9624260817, 18.0280122323))
            ThreePointArc((56.9624260817, 18.0280122323), (48.9528524491, 18.9625164059), (41.2742593566, 16.4996368009))
            ThreePointArc((41.2742593566, 16.4996368009), (36.0093683943, 26.0600822685), (28.5734714877, 34.0493645629))
        make_face()
        with BuildLine():
            ThreePointArc((-28.5734917033, 34.0493475985), (-42.0273157024, 24.726354484), (-56.9623641312, 18.0280032511))
            ThreePointArc((-56.9623641312, 18.0280032511), (-48.9528192327, 18.9625217645), (-41.274242812, 16.4996781876))
            ThreePointArc((-41.274242812, 16.4996781876), (-36.0093630649, 26.0600896326), (-28.5734917033, 34.0493475985))
        make_face()
        with BuildLine():
            ThreePointArc((-28.5765486506, -34.0467820392), (-42.0295355464, -24.7225810337), (-56.9639825151, -18.02288891))
            ThreePointArc((-56.9639825151, -18.02288891), (-48.954521553, -18.9581265429), (-41.2757240411, -16.4959723838))
            ThreePointArc((-41.2757240411, -16.4959723838), (-36.0117026803, -26.0568564885), (-28.5765486506, -34.0467820392))
        make_face()
    extrude(amount=F4_T1_DEPTH)

    # F0 (on Top) → F5 (cut)
    with BuildSketch(Plane.XY):
        with BuildLine():
            ThreePointArc((-43.9541916189, -6.620539187), (-44.4499999552, 0.0019954336), (-43.953597028, 6.6244855122))
            ThreePointArc((-43.953597028, 6.6244855122), (-47.0817723125, 8.7716056601), (-50.7999117786, 9.5272804916))
            Line((-50.7999117786, 9.5272804916), (-50.7999117786, -9.5227195084))
            ThreePointArc((-50.7999117786, -9.5227195084), (-47.0821659857, -8.7672115815), (-43.9541916189, -6.620539187))
        make_face()
        with BuildLine():
            ThreePointArc((-41.2749117786, 0.0022804916), (-41.9699408557, 3.5740081548), (-43.953597028, 6.6244855122))
            ThreePointArc((-43.953597028, 6.6244855122), (-44.4499999552, 0.0019954336), (-43.9541916189, -6.620539187))
            ThreePointArc((-43.9541916189, -6.620539187), (-41.9701012053, -3.5698435599), (-41.2749117786, 0.0022804916))
        make_face()
        with BuildLine():
            Line((-50.7999117786, -9.5227195084), (-50.7999117786, 9.5272804916))
            ThreePointArc((-50.7999117786, 9.5272804916), (-60.3249117786, 0.0022804916), (-50.7999117786, -9.5227195084))
        make_face()
        with BuildLine():
            ThreePointArc((44.45, 0), (44.3257285137, 3.3214893838), (43.9536089212, 6.6244066))
            ThreePointArc((43.9536089212, 6.6244066), (41.2750000096, 0.0018528994), (43.954203504, -6.6204602806))
            ThreePointArc((43.954203504, -6.6204602806), (44.3258775759, -3.319499529), (44.45, 0))
        make_face()
        with BuildLine():
            ThreePointArc((50.8, 9.5272804916), (47.0818099956, 8.771584232), (43.9536089212, 6.6244066))
            ThreePointArc((43.9536089212, 6.6244066), (44.3257285137, 3.3214893838), (44.45, 0))
            ThreePointArc((44.45, 0), (44.3258775759, -3.319499529), (43.954203504, -6.6204602806))
            ThreePointArc((43.954203504, -6.6204602806), (47.0822036672, -8.7671901554), (50.8, -9.5227195084))
            Line((50.8, -9.5227195084), (50.8, 9.5272804916))
        make_face()
        with BuildLine():
            ThreePointArc((60.325, 0.0022804916), (57.5351920908, 6.7374725824), (50.8, 9.5272804916))
            Line((50.8, 9.5272804916), (50.8, -9.5227195084))
            ThreePointArc((50.8, -9.5227195084), (57.5351920908, -6.7329115992), (60.325, 0.0022804916))
        make_face()
    extrude(amount=F5_DEPTH, mode=Mode.SUBTRACT)


solid = f1.part
